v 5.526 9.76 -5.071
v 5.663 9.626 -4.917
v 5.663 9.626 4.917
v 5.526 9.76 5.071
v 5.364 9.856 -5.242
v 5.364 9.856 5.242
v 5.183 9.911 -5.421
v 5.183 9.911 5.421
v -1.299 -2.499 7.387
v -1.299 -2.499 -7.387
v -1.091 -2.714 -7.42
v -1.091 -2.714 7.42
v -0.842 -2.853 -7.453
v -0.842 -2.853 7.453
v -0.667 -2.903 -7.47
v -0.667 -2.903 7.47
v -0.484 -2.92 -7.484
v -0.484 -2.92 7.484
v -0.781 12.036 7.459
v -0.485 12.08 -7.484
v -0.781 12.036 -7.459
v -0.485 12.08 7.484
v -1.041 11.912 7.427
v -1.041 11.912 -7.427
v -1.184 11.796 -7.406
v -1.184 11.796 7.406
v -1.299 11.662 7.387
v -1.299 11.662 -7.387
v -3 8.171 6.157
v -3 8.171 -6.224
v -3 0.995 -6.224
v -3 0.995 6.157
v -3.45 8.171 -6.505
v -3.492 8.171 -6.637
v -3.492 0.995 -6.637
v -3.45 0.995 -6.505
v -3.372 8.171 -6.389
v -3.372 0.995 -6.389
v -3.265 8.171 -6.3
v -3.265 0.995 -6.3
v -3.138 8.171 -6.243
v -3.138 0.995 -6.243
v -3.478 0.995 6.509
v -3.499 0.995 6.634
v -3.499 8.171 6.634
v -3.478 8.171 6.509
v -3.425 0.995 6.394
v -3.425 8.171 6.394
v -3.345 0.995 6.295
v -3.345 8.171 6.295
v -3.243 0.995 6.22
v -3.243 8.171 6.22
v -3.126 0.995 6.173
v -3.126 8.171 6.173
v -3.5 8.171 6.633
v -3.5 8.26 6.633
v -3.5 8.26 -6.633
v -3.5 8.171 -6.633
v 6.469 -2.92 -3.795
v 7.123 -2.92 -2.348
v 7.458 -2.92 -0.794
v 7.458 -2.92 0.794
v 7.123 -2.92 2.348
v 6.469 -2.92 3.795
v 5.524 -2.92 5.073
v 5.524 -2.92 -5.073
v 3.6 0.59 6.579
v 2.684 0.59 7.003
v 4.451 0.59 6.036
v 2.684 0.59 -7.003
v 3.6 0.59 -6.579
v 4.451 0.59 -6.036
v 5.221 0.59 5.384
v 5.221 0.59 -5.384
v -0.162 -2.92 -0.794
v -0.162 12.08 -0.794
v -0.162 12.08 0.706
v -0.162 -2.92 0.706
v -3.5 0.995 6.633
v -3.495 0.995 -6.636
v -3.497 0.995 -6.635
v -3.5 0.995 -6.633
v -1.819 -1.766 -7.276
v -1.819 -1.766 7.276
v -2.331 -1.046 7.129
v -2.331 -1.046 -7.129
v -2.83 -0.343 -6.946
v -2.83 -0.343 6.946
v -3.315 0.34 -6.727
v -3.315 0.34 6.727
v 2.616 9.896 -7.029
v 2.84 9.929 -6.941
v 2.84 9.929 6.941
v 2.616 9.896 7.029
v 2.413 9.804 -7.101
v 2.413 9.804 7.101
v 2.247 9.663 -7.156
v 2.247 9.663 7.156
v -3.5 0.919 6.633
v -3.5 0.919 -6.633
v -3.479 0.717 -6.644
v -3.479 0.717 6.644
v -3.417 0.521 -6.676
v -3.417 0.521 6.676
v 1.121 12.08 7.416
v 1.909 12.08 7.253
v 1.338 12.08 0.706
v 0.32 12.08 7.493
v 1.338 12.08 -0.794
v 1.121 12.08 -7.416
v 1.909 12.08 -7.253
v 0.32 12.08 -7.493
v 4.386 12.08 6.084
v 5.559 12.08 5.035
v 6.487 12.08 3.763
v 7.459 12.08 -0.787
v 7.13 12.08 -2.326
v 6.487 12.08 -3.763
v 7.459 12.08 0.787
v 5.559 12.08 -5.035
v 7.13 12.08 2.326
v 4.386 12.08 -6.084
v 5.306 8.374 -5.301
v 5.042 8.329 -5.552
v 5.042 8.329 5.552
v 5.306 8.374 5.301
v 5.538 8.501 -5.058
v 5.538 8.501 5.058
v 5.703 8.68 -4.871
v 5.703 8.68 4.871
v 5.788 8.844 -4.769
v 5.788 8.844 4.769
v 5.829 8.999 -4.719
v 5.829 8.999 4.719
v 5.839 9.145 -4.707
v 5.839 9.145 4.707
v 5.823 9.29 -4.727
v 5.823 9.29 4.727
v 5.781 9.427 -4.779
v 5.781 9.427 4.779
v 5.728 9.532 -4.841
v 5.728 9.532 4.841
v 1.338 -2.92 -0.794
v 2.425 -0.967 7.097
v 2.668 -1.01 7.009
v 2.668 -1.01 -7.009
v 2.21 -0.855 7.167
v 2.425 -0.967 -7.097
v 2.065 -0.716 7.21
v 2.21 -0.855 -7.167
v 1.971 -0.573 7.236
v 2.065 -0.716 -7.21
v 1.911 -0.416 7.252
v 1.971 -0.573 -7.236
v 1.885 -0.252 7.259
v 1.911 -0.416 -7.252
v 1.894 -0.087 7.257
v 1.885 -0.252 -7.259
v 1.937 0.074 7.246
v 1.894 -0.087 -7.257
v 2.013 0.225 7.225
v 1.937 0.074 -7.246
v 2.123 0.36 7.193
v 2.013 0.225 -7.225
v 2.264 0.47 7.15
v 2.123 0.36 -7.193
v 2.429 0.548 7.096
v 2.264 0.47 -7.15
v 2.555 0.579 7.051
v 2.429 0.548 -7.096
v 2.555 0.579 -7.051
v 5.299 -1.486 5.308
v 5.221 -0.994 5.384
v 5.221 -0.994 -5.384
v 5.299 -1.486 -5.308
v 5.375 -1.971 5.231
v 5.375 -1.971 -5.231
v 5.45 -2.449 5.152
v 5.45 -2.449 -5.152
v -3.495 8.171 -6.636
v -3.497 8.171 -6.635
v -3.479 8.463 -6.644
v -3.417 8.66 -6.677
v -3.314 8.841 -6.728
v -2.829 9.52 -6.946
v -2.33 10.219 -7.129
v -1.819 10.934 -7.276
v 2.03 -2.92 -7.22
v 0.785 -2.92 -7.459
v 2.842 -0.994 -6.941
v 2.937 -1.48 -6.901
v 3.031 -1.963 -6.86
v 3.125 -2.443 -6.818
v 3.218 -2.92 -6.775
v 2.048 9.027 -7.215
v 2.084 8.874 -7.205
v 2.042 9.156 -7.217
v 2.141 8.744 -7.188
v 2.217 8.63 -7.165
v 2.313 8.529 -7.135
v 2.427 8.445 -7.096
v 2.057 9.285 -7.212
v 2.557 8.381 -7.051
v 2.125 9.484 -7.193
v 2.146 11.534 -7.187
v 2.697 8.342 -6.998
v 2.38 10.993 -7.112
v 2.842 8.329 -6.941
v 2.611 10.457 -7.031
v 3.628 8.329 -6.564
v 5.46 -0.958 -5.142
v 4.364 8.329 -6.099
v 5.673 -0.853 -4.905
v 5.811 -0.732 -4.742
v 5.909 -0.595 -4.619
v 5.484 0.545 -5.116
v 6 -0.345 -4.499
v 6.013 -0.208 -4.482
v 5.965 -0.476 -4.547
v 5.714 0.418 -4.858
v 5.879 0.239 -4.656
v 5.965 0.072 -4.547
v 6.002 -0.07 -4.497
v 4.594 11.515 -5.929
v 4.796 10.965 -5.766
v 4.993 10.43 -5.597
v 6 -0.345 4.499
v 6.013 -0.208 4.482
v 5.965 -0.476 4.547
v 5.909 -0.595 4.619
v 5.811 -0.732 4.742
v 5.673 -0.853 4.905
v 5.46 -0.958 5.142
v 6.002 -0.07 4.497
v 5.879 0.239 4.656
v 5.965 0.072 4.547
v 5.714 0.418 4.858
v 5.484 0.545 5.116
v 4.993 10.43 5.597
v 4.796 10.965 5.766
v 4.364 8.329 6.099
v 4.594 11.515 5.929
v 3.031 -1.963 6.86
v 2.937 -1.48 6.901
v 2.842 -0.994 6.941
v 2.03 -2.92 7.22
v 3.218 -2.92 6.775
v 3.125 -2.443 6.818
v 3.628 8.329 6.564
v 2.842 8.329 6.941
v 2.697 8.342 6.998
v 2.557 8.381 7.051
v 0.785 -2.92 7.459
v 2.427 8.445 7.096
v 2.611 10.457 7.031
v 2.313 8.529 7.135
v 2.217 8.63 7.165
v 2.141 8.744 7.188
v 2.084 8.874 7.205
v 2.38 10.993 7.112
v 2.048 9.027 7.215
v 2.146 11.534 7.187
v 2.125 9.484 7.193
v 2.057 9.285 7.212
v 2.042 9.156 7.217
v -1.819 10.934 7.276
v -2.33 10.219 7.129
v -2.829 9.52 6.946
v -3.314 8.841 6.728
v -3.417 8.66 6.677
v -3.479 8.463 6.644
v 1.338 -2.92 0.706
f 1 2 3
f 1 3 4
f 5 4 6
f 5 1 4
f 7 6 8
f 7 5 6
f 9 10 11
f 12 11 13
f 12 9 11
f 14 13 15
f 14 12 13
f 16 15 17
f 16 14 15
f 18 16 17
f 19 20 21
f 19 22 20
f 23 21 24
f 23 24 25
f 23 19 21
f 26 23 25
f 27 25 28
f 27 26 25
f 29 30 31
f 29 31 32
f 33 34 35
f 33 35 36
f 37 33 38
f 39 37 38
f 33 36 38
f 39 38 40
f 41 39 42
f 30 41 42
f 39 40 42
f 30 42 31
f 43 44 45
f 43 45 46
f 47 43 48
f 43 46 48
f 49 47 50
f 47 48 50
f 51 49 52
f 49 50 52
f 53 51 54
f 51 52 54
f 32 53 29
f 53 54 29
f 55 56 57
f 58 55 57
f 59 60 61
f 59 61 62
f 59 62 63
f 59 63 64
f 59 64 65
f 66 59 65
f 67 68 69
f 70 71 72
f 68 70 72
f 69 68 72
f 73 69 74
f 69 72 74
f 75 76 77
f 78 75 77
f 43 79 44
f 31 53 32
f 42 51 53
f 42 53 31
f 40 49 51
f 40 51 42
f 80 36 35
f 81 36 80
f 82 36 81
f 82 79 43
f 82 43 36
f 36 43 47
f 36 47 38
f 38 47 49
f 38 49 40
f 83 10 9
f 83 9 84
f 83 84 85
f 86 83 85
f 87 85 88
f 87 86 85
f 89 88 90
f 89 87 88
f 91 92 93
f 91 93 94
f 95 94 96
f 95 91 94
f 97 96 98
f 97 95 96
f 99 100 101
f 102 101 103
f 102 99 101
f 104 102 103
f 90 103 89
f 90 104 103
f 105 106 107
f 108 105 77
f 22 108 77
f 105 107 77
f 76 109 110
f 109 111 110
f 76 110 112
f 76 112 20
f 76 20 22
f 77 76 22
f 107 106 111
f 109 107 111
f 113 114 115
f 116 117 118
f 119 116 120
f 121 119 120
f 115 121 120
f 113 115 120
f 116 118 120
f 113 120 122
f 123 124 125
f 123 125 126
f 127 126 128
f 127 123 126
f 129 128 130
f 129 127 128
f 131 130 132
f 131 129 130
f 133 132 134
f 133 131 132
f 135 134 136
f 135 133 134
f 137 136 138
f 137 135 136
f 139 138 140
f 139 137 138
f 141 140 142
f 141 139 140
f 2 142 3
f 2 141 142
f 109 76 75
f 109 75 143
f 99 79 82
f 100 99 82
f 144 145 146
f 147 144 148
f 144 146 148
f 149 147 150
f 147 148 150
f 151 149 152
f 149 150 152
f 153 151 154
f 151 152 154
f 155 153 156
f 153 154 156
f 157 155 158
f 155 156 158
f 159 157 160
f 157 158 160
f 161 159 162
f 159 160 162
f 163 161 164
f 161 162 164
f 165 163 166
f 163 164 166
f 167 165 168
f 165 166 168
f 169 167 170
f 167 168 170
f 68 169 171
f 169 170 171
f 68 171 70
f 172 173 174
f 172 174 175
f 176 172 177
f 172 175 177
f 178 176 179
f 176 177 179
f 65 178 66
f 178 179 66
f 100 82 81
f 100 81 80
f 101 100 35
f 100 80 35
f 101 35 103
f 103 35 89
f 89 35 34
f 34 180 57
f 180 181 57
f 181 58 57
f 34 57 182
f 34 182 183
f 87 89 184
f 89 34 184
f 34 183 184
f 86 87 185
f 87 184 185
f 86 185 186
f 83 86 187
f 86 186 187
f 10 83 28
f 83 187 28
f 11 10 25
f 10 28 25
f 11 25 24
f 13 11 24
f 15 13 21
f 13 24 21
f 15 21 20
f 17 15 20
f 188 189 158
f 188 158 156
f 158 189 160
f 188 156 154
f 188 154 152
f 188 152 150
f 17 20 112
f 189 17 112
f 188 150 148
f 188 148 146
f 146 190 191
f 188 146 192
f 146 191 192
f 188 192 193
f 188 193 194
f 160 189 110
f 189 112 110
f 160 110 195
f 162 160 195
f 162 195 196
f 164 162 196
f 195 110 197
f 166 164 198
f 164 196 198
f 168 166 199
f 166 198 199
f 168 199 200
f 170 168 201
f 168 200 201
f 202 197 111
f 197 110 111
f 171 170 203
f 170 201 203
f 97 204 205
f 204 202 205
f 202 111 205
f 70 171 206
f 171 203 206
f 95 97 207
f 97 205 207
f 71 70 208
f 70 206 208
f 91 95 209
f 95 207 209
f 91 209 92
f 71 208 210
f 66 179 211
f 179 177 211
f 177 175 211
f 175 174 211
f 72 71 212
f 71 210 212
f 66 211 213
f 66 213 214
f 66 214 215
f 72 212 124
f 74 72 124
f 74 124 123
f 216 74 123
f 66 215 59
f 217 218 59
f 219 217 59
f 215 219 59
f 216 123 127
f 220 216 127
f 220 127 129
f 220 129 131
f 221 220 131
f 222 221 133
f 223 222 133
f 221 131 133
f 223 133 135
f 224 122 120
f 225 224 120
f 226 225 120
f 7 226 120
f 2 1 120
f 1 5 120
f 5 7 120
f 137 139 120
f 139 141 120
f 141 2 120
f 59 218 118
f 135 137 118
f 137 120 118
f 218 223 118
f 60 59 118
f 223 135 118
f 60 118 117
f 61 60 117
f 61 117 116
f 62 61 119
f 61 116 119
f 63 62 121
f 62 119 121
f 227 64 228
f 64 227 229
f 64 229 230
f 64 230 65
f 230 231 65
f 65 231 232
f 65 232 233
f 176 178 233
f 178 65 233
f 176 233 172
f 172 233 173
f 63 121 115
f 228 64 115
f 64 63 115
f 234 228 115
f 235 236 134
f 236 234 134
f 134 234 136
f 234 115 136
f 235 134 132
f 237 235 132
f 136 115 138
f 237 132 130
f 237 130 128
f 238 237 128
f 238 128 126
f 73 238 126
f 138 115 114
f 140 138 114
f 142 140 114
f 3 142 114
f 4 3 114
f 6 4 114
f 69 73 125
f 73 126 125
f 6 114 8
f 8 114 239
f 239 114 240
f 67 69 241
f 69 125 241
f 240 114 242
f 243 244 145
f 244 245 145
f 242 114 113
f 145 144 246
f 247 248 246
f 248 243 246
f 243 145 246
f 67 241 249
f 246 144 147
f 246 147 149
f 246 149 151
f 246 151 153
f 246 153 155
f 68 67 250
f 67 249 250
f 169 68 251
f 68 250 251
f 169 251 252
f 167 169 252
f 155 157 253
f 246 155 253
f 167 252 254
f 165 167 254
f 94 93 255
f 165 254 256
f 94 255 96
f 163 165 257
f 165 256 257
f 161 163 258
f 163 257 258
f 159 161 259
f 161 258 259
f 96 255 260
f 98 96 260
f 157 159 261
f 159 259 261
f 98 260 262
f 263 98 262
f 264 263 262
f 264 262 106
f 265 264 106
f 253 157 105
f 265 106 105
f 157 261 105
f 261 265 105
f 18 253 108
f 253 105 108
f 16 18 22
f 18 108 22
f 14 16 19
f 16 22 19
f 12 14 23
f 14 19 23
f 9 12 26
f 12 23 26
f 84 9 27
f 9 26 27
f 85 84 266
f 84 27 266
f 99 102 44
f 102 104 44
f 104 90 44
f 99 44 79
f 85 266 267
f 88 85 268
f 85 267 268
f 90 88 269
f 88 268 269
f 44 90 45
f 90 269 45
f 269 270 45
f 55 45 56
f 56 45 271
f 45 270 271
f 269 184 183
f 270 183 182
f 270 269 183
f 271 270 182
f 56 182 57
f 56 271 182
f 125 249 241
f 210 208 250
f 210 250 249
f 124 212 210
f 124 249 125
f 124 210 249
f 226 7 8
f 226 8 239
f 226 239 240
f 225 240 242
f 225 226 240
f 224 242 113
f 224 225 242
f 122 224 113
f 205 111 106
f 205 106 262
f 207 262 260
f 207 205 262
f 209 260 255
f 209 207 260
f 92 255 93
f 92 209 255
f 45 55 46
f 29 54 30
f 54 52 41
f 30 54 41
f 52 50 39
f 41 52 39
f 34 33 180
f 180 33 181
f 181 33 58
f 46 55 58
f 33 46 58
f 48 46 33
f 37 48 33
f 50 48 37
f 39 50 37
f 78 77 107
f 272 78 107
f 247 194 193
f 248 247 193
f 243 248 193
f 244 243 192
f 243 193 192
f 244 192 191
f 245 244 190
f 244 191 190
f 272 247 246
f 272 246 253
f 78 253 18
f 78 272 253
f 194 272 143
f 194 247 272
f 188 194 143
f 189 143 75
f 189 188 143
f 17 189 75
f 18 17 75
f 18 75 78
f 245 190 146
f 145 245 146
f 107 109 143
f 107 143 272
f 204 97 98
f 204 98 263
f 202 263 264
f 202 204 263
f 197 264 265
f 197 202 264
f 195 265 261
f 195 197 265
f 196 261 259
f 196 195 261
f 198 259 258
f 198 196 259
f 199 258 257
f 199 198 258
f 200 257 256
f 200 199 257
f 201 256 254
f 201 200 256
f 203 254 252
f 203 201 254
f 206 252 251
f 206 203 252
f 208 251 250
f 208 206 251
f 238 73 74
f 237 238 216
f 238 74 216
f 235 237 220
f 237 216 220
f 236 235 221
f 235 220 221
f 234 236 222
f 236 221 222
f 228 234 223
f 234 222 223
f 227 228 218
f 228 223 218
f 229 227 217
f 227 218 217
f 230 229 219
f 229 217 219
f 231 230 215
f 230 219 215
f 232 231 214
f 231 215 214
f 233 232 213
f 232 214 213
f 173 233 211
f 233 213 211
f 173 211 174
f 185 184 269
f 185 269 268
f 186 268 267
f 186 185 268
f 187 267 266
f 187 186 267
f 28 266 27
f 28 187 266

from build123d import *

# Parameters (mm, degrees)
SKETCH1_W               = 7.5
SKETCH1_H               = 15
CUT_EXTRUDE1_START      = -20
CUT_EXTRUDE1_DEPTH      = 20
SKETCH4_W               = 1.5
SKETCH4_H               = 1.5
CUT_EXTRUDE2_DEPTH      = 20
CUT_EXTRUDE3_DEPTH      = 17.075914552
CUT_EXTRUDE3_DEPTH_BACK = 17.075914552
CUT_EXTRUDE4_DEPTH      = 17.075914721
CUT_EXTRUDE4_DEPTH_BACK = 17.075914721
SKETCH8_W               = 12.380653288
SKETCH8_H               = 7.175906378
CUT_EXTRUDE5_DEPTH      = 0.5
FILLET2_R               = 1
FILLET5_R               = 0.5


with BuildPart() as part:
    # Sketch1 → Revolve1 (revolve)
    with BuildSketch(Plane.XY):
        with Locations((-3.75, 4.580357143)):
            Rectangle(SKETCH1_W, SKETCH1_H)
    revolve(axis=Axis((0, 12.080357143, 0), (0, -1, 0)))

    # Sketch2 → Cut-Extrude1 (cut)
    with BuildSketch(Plane.XZ.offset(2.919642857).offset(CUT_EXTRUDE1_START)):
        with BuildLine():
            Line((-3.5, 6.633249581), (-3.5, -6.633249581))
            ThreePointArc((-3.5, -6.633249581), (-7.5, 0), (-3.5, 6.633249581))
        make_face()
    extrude(amount=CUT_EXTRUDE1_DEPTH, mode=Mode.SUBTRACT)

    # Sketch4 → Cut-Extrude2 (cut)
    with BuildSketch(Plane.XZ.offset(2.919642857)):
        with Locations((0.588025285, -0.043999564)):
            Rectangle(SKETCH4_W, SKETCH4_H)
    extrude(amount=-CUT_EXTRUDE2_DEPTH, mode=Mode.SUBTRACT)

    # Sketch6 → Cut-Extrude3 (cut, two sides: drawn at the far end of the back side and taken through both)
    with BuildSketch(Plane.XY.offset(-CUT_EXTRUDE3_DEPTH_BACK)):
        with BuildLine():
            Line((2.684394406, 0.589840789), (5.221333223, 0.589840789))
            ThreePointArc((5.221333223, 0.589840789), (6.01349632, -0.202322309), (5.221333223, -0.994485407))
            Line((5.221333223, -0.994485407), (5.524196013, -2.919642857))
            Line((5.524196013, -2.919642857), (3.217926739, -2.919642857))
            Line((3.217926739, -2.919642857), (2.84197746, -0.994485407))
            ThreePointArc((2.84197746, -0.994485407), (2.755326831, -1.007008376), (2.667826658, -1.009987637))
            ThreePointArc((2.667826658, -1.009987637), (1.8844373, -0.201874894), (2.684394406, 0.589840789))
        make_face()
        with BuildLine():
            Line((2.84197746, 8.328542626), (5.04197746, 8.328542626))
            ThreePointArc((5.04197746, 8.328542626), (5.761372587, 8.781718764), (5.663273755, 9.626274613))
            ThreePointArc((5.663273755, 9.626274613), (5.448979722, 9.81206297), (5.183221531, 9.91111765))
            Line((5.183221531, 9.91111765), (4.385819176, 12.080357143))
            Line((4.385819176, 12.080357143), (1.90930103, 12.080357143))
            Line((1.90930103, 12.080357143), (2.840116682, 9.928540462))
            ThreePointArc((2.840116682, 9.928540462), (2.515101589, 9.858715321), (2.24652895, 9.662809481))
            ThreePointArc((2.24652895, 9.662809481), (2.111425106, 8.802516157), (2.84197746, 8.328542626))
        make_face()
    extrude(amount=CUT_EXTRUDE3_DEPTH + CUT_EXTRUDE3_DEPTH_BACK, mode=Mode.SUBTRACT)

    # Sketch7 → Cut-Extrude4 (cut, two sides: drawn at the far end of the back side and taken through both)
    with BuildSketch(Plane.XY.offset(-CUT_EXTRUDE4_DEPTH_BACK)):
        Polygon((-3.5, 0.600357143), (-3.5, -2.919642857), (-1, -2.919642857), align=None)
        Polygon((-3.5, 12.080357143), (-3.5, 8.580357143), (-1, 12.080357143), align=None)
    extrude(amount=CUT_EXTRUDE4_DEPTH + CUT_EXTRUDE4_DEPTH_BACK, mode=Mode.SUBTRACT)

    # Sketch8 → Cut-Extrude5 (cut)
    with BuildSketch(Plane.ZY.offset(3.5)):
        with Locations((-0.033221789, 4.583246246)):
            Rectangle(SKETCH8_W, SKETCH8_H)
    extrude(amount=-CUT_EXTRUDE5_DEPTH, mode=Mode.SUBTRACT)

    # Fillet2
    fillet2_edges = [part.edges().sort_by_distance(p)[0] for p in [
        (-1, 12.080357143, 0),
        (-3.5, 8.580357143, 0),
        (-1, -2.919642857, 0),
        (-3.5, 0.600357143, 0),
    ]]
    fillet(fillet2_edges, radius=FILLET2_R)

    # Fillet5
    # the kernel refuses this fillet: 0.5 mm, written as the material it takes off along each edge
    with BuildSketch(Plane(origin=(-3.5, 8.171199435, 6.157104855), x_dir=(0, 0, 1), z_dir=(0, -1, 0)), Plane(origin=(-3.5, 0.995293057, -6.223548433), x_dir=(0, 0, -1), z_dir=(0, 1, 0))) as fillet5_piece_1:
        with BuildLine():
            CenterArc((FILLET5_R, -FILLET5_R), FILLET5_R, 90, 90)
            Line((0, -FILLET5_R), (0, 0))
            Line((0, 0), (FILLET5_R, 0))
        make_face()
    extrude(amount=7.175906378, mode=Mode.SUBTRACT)


solid = part.part
